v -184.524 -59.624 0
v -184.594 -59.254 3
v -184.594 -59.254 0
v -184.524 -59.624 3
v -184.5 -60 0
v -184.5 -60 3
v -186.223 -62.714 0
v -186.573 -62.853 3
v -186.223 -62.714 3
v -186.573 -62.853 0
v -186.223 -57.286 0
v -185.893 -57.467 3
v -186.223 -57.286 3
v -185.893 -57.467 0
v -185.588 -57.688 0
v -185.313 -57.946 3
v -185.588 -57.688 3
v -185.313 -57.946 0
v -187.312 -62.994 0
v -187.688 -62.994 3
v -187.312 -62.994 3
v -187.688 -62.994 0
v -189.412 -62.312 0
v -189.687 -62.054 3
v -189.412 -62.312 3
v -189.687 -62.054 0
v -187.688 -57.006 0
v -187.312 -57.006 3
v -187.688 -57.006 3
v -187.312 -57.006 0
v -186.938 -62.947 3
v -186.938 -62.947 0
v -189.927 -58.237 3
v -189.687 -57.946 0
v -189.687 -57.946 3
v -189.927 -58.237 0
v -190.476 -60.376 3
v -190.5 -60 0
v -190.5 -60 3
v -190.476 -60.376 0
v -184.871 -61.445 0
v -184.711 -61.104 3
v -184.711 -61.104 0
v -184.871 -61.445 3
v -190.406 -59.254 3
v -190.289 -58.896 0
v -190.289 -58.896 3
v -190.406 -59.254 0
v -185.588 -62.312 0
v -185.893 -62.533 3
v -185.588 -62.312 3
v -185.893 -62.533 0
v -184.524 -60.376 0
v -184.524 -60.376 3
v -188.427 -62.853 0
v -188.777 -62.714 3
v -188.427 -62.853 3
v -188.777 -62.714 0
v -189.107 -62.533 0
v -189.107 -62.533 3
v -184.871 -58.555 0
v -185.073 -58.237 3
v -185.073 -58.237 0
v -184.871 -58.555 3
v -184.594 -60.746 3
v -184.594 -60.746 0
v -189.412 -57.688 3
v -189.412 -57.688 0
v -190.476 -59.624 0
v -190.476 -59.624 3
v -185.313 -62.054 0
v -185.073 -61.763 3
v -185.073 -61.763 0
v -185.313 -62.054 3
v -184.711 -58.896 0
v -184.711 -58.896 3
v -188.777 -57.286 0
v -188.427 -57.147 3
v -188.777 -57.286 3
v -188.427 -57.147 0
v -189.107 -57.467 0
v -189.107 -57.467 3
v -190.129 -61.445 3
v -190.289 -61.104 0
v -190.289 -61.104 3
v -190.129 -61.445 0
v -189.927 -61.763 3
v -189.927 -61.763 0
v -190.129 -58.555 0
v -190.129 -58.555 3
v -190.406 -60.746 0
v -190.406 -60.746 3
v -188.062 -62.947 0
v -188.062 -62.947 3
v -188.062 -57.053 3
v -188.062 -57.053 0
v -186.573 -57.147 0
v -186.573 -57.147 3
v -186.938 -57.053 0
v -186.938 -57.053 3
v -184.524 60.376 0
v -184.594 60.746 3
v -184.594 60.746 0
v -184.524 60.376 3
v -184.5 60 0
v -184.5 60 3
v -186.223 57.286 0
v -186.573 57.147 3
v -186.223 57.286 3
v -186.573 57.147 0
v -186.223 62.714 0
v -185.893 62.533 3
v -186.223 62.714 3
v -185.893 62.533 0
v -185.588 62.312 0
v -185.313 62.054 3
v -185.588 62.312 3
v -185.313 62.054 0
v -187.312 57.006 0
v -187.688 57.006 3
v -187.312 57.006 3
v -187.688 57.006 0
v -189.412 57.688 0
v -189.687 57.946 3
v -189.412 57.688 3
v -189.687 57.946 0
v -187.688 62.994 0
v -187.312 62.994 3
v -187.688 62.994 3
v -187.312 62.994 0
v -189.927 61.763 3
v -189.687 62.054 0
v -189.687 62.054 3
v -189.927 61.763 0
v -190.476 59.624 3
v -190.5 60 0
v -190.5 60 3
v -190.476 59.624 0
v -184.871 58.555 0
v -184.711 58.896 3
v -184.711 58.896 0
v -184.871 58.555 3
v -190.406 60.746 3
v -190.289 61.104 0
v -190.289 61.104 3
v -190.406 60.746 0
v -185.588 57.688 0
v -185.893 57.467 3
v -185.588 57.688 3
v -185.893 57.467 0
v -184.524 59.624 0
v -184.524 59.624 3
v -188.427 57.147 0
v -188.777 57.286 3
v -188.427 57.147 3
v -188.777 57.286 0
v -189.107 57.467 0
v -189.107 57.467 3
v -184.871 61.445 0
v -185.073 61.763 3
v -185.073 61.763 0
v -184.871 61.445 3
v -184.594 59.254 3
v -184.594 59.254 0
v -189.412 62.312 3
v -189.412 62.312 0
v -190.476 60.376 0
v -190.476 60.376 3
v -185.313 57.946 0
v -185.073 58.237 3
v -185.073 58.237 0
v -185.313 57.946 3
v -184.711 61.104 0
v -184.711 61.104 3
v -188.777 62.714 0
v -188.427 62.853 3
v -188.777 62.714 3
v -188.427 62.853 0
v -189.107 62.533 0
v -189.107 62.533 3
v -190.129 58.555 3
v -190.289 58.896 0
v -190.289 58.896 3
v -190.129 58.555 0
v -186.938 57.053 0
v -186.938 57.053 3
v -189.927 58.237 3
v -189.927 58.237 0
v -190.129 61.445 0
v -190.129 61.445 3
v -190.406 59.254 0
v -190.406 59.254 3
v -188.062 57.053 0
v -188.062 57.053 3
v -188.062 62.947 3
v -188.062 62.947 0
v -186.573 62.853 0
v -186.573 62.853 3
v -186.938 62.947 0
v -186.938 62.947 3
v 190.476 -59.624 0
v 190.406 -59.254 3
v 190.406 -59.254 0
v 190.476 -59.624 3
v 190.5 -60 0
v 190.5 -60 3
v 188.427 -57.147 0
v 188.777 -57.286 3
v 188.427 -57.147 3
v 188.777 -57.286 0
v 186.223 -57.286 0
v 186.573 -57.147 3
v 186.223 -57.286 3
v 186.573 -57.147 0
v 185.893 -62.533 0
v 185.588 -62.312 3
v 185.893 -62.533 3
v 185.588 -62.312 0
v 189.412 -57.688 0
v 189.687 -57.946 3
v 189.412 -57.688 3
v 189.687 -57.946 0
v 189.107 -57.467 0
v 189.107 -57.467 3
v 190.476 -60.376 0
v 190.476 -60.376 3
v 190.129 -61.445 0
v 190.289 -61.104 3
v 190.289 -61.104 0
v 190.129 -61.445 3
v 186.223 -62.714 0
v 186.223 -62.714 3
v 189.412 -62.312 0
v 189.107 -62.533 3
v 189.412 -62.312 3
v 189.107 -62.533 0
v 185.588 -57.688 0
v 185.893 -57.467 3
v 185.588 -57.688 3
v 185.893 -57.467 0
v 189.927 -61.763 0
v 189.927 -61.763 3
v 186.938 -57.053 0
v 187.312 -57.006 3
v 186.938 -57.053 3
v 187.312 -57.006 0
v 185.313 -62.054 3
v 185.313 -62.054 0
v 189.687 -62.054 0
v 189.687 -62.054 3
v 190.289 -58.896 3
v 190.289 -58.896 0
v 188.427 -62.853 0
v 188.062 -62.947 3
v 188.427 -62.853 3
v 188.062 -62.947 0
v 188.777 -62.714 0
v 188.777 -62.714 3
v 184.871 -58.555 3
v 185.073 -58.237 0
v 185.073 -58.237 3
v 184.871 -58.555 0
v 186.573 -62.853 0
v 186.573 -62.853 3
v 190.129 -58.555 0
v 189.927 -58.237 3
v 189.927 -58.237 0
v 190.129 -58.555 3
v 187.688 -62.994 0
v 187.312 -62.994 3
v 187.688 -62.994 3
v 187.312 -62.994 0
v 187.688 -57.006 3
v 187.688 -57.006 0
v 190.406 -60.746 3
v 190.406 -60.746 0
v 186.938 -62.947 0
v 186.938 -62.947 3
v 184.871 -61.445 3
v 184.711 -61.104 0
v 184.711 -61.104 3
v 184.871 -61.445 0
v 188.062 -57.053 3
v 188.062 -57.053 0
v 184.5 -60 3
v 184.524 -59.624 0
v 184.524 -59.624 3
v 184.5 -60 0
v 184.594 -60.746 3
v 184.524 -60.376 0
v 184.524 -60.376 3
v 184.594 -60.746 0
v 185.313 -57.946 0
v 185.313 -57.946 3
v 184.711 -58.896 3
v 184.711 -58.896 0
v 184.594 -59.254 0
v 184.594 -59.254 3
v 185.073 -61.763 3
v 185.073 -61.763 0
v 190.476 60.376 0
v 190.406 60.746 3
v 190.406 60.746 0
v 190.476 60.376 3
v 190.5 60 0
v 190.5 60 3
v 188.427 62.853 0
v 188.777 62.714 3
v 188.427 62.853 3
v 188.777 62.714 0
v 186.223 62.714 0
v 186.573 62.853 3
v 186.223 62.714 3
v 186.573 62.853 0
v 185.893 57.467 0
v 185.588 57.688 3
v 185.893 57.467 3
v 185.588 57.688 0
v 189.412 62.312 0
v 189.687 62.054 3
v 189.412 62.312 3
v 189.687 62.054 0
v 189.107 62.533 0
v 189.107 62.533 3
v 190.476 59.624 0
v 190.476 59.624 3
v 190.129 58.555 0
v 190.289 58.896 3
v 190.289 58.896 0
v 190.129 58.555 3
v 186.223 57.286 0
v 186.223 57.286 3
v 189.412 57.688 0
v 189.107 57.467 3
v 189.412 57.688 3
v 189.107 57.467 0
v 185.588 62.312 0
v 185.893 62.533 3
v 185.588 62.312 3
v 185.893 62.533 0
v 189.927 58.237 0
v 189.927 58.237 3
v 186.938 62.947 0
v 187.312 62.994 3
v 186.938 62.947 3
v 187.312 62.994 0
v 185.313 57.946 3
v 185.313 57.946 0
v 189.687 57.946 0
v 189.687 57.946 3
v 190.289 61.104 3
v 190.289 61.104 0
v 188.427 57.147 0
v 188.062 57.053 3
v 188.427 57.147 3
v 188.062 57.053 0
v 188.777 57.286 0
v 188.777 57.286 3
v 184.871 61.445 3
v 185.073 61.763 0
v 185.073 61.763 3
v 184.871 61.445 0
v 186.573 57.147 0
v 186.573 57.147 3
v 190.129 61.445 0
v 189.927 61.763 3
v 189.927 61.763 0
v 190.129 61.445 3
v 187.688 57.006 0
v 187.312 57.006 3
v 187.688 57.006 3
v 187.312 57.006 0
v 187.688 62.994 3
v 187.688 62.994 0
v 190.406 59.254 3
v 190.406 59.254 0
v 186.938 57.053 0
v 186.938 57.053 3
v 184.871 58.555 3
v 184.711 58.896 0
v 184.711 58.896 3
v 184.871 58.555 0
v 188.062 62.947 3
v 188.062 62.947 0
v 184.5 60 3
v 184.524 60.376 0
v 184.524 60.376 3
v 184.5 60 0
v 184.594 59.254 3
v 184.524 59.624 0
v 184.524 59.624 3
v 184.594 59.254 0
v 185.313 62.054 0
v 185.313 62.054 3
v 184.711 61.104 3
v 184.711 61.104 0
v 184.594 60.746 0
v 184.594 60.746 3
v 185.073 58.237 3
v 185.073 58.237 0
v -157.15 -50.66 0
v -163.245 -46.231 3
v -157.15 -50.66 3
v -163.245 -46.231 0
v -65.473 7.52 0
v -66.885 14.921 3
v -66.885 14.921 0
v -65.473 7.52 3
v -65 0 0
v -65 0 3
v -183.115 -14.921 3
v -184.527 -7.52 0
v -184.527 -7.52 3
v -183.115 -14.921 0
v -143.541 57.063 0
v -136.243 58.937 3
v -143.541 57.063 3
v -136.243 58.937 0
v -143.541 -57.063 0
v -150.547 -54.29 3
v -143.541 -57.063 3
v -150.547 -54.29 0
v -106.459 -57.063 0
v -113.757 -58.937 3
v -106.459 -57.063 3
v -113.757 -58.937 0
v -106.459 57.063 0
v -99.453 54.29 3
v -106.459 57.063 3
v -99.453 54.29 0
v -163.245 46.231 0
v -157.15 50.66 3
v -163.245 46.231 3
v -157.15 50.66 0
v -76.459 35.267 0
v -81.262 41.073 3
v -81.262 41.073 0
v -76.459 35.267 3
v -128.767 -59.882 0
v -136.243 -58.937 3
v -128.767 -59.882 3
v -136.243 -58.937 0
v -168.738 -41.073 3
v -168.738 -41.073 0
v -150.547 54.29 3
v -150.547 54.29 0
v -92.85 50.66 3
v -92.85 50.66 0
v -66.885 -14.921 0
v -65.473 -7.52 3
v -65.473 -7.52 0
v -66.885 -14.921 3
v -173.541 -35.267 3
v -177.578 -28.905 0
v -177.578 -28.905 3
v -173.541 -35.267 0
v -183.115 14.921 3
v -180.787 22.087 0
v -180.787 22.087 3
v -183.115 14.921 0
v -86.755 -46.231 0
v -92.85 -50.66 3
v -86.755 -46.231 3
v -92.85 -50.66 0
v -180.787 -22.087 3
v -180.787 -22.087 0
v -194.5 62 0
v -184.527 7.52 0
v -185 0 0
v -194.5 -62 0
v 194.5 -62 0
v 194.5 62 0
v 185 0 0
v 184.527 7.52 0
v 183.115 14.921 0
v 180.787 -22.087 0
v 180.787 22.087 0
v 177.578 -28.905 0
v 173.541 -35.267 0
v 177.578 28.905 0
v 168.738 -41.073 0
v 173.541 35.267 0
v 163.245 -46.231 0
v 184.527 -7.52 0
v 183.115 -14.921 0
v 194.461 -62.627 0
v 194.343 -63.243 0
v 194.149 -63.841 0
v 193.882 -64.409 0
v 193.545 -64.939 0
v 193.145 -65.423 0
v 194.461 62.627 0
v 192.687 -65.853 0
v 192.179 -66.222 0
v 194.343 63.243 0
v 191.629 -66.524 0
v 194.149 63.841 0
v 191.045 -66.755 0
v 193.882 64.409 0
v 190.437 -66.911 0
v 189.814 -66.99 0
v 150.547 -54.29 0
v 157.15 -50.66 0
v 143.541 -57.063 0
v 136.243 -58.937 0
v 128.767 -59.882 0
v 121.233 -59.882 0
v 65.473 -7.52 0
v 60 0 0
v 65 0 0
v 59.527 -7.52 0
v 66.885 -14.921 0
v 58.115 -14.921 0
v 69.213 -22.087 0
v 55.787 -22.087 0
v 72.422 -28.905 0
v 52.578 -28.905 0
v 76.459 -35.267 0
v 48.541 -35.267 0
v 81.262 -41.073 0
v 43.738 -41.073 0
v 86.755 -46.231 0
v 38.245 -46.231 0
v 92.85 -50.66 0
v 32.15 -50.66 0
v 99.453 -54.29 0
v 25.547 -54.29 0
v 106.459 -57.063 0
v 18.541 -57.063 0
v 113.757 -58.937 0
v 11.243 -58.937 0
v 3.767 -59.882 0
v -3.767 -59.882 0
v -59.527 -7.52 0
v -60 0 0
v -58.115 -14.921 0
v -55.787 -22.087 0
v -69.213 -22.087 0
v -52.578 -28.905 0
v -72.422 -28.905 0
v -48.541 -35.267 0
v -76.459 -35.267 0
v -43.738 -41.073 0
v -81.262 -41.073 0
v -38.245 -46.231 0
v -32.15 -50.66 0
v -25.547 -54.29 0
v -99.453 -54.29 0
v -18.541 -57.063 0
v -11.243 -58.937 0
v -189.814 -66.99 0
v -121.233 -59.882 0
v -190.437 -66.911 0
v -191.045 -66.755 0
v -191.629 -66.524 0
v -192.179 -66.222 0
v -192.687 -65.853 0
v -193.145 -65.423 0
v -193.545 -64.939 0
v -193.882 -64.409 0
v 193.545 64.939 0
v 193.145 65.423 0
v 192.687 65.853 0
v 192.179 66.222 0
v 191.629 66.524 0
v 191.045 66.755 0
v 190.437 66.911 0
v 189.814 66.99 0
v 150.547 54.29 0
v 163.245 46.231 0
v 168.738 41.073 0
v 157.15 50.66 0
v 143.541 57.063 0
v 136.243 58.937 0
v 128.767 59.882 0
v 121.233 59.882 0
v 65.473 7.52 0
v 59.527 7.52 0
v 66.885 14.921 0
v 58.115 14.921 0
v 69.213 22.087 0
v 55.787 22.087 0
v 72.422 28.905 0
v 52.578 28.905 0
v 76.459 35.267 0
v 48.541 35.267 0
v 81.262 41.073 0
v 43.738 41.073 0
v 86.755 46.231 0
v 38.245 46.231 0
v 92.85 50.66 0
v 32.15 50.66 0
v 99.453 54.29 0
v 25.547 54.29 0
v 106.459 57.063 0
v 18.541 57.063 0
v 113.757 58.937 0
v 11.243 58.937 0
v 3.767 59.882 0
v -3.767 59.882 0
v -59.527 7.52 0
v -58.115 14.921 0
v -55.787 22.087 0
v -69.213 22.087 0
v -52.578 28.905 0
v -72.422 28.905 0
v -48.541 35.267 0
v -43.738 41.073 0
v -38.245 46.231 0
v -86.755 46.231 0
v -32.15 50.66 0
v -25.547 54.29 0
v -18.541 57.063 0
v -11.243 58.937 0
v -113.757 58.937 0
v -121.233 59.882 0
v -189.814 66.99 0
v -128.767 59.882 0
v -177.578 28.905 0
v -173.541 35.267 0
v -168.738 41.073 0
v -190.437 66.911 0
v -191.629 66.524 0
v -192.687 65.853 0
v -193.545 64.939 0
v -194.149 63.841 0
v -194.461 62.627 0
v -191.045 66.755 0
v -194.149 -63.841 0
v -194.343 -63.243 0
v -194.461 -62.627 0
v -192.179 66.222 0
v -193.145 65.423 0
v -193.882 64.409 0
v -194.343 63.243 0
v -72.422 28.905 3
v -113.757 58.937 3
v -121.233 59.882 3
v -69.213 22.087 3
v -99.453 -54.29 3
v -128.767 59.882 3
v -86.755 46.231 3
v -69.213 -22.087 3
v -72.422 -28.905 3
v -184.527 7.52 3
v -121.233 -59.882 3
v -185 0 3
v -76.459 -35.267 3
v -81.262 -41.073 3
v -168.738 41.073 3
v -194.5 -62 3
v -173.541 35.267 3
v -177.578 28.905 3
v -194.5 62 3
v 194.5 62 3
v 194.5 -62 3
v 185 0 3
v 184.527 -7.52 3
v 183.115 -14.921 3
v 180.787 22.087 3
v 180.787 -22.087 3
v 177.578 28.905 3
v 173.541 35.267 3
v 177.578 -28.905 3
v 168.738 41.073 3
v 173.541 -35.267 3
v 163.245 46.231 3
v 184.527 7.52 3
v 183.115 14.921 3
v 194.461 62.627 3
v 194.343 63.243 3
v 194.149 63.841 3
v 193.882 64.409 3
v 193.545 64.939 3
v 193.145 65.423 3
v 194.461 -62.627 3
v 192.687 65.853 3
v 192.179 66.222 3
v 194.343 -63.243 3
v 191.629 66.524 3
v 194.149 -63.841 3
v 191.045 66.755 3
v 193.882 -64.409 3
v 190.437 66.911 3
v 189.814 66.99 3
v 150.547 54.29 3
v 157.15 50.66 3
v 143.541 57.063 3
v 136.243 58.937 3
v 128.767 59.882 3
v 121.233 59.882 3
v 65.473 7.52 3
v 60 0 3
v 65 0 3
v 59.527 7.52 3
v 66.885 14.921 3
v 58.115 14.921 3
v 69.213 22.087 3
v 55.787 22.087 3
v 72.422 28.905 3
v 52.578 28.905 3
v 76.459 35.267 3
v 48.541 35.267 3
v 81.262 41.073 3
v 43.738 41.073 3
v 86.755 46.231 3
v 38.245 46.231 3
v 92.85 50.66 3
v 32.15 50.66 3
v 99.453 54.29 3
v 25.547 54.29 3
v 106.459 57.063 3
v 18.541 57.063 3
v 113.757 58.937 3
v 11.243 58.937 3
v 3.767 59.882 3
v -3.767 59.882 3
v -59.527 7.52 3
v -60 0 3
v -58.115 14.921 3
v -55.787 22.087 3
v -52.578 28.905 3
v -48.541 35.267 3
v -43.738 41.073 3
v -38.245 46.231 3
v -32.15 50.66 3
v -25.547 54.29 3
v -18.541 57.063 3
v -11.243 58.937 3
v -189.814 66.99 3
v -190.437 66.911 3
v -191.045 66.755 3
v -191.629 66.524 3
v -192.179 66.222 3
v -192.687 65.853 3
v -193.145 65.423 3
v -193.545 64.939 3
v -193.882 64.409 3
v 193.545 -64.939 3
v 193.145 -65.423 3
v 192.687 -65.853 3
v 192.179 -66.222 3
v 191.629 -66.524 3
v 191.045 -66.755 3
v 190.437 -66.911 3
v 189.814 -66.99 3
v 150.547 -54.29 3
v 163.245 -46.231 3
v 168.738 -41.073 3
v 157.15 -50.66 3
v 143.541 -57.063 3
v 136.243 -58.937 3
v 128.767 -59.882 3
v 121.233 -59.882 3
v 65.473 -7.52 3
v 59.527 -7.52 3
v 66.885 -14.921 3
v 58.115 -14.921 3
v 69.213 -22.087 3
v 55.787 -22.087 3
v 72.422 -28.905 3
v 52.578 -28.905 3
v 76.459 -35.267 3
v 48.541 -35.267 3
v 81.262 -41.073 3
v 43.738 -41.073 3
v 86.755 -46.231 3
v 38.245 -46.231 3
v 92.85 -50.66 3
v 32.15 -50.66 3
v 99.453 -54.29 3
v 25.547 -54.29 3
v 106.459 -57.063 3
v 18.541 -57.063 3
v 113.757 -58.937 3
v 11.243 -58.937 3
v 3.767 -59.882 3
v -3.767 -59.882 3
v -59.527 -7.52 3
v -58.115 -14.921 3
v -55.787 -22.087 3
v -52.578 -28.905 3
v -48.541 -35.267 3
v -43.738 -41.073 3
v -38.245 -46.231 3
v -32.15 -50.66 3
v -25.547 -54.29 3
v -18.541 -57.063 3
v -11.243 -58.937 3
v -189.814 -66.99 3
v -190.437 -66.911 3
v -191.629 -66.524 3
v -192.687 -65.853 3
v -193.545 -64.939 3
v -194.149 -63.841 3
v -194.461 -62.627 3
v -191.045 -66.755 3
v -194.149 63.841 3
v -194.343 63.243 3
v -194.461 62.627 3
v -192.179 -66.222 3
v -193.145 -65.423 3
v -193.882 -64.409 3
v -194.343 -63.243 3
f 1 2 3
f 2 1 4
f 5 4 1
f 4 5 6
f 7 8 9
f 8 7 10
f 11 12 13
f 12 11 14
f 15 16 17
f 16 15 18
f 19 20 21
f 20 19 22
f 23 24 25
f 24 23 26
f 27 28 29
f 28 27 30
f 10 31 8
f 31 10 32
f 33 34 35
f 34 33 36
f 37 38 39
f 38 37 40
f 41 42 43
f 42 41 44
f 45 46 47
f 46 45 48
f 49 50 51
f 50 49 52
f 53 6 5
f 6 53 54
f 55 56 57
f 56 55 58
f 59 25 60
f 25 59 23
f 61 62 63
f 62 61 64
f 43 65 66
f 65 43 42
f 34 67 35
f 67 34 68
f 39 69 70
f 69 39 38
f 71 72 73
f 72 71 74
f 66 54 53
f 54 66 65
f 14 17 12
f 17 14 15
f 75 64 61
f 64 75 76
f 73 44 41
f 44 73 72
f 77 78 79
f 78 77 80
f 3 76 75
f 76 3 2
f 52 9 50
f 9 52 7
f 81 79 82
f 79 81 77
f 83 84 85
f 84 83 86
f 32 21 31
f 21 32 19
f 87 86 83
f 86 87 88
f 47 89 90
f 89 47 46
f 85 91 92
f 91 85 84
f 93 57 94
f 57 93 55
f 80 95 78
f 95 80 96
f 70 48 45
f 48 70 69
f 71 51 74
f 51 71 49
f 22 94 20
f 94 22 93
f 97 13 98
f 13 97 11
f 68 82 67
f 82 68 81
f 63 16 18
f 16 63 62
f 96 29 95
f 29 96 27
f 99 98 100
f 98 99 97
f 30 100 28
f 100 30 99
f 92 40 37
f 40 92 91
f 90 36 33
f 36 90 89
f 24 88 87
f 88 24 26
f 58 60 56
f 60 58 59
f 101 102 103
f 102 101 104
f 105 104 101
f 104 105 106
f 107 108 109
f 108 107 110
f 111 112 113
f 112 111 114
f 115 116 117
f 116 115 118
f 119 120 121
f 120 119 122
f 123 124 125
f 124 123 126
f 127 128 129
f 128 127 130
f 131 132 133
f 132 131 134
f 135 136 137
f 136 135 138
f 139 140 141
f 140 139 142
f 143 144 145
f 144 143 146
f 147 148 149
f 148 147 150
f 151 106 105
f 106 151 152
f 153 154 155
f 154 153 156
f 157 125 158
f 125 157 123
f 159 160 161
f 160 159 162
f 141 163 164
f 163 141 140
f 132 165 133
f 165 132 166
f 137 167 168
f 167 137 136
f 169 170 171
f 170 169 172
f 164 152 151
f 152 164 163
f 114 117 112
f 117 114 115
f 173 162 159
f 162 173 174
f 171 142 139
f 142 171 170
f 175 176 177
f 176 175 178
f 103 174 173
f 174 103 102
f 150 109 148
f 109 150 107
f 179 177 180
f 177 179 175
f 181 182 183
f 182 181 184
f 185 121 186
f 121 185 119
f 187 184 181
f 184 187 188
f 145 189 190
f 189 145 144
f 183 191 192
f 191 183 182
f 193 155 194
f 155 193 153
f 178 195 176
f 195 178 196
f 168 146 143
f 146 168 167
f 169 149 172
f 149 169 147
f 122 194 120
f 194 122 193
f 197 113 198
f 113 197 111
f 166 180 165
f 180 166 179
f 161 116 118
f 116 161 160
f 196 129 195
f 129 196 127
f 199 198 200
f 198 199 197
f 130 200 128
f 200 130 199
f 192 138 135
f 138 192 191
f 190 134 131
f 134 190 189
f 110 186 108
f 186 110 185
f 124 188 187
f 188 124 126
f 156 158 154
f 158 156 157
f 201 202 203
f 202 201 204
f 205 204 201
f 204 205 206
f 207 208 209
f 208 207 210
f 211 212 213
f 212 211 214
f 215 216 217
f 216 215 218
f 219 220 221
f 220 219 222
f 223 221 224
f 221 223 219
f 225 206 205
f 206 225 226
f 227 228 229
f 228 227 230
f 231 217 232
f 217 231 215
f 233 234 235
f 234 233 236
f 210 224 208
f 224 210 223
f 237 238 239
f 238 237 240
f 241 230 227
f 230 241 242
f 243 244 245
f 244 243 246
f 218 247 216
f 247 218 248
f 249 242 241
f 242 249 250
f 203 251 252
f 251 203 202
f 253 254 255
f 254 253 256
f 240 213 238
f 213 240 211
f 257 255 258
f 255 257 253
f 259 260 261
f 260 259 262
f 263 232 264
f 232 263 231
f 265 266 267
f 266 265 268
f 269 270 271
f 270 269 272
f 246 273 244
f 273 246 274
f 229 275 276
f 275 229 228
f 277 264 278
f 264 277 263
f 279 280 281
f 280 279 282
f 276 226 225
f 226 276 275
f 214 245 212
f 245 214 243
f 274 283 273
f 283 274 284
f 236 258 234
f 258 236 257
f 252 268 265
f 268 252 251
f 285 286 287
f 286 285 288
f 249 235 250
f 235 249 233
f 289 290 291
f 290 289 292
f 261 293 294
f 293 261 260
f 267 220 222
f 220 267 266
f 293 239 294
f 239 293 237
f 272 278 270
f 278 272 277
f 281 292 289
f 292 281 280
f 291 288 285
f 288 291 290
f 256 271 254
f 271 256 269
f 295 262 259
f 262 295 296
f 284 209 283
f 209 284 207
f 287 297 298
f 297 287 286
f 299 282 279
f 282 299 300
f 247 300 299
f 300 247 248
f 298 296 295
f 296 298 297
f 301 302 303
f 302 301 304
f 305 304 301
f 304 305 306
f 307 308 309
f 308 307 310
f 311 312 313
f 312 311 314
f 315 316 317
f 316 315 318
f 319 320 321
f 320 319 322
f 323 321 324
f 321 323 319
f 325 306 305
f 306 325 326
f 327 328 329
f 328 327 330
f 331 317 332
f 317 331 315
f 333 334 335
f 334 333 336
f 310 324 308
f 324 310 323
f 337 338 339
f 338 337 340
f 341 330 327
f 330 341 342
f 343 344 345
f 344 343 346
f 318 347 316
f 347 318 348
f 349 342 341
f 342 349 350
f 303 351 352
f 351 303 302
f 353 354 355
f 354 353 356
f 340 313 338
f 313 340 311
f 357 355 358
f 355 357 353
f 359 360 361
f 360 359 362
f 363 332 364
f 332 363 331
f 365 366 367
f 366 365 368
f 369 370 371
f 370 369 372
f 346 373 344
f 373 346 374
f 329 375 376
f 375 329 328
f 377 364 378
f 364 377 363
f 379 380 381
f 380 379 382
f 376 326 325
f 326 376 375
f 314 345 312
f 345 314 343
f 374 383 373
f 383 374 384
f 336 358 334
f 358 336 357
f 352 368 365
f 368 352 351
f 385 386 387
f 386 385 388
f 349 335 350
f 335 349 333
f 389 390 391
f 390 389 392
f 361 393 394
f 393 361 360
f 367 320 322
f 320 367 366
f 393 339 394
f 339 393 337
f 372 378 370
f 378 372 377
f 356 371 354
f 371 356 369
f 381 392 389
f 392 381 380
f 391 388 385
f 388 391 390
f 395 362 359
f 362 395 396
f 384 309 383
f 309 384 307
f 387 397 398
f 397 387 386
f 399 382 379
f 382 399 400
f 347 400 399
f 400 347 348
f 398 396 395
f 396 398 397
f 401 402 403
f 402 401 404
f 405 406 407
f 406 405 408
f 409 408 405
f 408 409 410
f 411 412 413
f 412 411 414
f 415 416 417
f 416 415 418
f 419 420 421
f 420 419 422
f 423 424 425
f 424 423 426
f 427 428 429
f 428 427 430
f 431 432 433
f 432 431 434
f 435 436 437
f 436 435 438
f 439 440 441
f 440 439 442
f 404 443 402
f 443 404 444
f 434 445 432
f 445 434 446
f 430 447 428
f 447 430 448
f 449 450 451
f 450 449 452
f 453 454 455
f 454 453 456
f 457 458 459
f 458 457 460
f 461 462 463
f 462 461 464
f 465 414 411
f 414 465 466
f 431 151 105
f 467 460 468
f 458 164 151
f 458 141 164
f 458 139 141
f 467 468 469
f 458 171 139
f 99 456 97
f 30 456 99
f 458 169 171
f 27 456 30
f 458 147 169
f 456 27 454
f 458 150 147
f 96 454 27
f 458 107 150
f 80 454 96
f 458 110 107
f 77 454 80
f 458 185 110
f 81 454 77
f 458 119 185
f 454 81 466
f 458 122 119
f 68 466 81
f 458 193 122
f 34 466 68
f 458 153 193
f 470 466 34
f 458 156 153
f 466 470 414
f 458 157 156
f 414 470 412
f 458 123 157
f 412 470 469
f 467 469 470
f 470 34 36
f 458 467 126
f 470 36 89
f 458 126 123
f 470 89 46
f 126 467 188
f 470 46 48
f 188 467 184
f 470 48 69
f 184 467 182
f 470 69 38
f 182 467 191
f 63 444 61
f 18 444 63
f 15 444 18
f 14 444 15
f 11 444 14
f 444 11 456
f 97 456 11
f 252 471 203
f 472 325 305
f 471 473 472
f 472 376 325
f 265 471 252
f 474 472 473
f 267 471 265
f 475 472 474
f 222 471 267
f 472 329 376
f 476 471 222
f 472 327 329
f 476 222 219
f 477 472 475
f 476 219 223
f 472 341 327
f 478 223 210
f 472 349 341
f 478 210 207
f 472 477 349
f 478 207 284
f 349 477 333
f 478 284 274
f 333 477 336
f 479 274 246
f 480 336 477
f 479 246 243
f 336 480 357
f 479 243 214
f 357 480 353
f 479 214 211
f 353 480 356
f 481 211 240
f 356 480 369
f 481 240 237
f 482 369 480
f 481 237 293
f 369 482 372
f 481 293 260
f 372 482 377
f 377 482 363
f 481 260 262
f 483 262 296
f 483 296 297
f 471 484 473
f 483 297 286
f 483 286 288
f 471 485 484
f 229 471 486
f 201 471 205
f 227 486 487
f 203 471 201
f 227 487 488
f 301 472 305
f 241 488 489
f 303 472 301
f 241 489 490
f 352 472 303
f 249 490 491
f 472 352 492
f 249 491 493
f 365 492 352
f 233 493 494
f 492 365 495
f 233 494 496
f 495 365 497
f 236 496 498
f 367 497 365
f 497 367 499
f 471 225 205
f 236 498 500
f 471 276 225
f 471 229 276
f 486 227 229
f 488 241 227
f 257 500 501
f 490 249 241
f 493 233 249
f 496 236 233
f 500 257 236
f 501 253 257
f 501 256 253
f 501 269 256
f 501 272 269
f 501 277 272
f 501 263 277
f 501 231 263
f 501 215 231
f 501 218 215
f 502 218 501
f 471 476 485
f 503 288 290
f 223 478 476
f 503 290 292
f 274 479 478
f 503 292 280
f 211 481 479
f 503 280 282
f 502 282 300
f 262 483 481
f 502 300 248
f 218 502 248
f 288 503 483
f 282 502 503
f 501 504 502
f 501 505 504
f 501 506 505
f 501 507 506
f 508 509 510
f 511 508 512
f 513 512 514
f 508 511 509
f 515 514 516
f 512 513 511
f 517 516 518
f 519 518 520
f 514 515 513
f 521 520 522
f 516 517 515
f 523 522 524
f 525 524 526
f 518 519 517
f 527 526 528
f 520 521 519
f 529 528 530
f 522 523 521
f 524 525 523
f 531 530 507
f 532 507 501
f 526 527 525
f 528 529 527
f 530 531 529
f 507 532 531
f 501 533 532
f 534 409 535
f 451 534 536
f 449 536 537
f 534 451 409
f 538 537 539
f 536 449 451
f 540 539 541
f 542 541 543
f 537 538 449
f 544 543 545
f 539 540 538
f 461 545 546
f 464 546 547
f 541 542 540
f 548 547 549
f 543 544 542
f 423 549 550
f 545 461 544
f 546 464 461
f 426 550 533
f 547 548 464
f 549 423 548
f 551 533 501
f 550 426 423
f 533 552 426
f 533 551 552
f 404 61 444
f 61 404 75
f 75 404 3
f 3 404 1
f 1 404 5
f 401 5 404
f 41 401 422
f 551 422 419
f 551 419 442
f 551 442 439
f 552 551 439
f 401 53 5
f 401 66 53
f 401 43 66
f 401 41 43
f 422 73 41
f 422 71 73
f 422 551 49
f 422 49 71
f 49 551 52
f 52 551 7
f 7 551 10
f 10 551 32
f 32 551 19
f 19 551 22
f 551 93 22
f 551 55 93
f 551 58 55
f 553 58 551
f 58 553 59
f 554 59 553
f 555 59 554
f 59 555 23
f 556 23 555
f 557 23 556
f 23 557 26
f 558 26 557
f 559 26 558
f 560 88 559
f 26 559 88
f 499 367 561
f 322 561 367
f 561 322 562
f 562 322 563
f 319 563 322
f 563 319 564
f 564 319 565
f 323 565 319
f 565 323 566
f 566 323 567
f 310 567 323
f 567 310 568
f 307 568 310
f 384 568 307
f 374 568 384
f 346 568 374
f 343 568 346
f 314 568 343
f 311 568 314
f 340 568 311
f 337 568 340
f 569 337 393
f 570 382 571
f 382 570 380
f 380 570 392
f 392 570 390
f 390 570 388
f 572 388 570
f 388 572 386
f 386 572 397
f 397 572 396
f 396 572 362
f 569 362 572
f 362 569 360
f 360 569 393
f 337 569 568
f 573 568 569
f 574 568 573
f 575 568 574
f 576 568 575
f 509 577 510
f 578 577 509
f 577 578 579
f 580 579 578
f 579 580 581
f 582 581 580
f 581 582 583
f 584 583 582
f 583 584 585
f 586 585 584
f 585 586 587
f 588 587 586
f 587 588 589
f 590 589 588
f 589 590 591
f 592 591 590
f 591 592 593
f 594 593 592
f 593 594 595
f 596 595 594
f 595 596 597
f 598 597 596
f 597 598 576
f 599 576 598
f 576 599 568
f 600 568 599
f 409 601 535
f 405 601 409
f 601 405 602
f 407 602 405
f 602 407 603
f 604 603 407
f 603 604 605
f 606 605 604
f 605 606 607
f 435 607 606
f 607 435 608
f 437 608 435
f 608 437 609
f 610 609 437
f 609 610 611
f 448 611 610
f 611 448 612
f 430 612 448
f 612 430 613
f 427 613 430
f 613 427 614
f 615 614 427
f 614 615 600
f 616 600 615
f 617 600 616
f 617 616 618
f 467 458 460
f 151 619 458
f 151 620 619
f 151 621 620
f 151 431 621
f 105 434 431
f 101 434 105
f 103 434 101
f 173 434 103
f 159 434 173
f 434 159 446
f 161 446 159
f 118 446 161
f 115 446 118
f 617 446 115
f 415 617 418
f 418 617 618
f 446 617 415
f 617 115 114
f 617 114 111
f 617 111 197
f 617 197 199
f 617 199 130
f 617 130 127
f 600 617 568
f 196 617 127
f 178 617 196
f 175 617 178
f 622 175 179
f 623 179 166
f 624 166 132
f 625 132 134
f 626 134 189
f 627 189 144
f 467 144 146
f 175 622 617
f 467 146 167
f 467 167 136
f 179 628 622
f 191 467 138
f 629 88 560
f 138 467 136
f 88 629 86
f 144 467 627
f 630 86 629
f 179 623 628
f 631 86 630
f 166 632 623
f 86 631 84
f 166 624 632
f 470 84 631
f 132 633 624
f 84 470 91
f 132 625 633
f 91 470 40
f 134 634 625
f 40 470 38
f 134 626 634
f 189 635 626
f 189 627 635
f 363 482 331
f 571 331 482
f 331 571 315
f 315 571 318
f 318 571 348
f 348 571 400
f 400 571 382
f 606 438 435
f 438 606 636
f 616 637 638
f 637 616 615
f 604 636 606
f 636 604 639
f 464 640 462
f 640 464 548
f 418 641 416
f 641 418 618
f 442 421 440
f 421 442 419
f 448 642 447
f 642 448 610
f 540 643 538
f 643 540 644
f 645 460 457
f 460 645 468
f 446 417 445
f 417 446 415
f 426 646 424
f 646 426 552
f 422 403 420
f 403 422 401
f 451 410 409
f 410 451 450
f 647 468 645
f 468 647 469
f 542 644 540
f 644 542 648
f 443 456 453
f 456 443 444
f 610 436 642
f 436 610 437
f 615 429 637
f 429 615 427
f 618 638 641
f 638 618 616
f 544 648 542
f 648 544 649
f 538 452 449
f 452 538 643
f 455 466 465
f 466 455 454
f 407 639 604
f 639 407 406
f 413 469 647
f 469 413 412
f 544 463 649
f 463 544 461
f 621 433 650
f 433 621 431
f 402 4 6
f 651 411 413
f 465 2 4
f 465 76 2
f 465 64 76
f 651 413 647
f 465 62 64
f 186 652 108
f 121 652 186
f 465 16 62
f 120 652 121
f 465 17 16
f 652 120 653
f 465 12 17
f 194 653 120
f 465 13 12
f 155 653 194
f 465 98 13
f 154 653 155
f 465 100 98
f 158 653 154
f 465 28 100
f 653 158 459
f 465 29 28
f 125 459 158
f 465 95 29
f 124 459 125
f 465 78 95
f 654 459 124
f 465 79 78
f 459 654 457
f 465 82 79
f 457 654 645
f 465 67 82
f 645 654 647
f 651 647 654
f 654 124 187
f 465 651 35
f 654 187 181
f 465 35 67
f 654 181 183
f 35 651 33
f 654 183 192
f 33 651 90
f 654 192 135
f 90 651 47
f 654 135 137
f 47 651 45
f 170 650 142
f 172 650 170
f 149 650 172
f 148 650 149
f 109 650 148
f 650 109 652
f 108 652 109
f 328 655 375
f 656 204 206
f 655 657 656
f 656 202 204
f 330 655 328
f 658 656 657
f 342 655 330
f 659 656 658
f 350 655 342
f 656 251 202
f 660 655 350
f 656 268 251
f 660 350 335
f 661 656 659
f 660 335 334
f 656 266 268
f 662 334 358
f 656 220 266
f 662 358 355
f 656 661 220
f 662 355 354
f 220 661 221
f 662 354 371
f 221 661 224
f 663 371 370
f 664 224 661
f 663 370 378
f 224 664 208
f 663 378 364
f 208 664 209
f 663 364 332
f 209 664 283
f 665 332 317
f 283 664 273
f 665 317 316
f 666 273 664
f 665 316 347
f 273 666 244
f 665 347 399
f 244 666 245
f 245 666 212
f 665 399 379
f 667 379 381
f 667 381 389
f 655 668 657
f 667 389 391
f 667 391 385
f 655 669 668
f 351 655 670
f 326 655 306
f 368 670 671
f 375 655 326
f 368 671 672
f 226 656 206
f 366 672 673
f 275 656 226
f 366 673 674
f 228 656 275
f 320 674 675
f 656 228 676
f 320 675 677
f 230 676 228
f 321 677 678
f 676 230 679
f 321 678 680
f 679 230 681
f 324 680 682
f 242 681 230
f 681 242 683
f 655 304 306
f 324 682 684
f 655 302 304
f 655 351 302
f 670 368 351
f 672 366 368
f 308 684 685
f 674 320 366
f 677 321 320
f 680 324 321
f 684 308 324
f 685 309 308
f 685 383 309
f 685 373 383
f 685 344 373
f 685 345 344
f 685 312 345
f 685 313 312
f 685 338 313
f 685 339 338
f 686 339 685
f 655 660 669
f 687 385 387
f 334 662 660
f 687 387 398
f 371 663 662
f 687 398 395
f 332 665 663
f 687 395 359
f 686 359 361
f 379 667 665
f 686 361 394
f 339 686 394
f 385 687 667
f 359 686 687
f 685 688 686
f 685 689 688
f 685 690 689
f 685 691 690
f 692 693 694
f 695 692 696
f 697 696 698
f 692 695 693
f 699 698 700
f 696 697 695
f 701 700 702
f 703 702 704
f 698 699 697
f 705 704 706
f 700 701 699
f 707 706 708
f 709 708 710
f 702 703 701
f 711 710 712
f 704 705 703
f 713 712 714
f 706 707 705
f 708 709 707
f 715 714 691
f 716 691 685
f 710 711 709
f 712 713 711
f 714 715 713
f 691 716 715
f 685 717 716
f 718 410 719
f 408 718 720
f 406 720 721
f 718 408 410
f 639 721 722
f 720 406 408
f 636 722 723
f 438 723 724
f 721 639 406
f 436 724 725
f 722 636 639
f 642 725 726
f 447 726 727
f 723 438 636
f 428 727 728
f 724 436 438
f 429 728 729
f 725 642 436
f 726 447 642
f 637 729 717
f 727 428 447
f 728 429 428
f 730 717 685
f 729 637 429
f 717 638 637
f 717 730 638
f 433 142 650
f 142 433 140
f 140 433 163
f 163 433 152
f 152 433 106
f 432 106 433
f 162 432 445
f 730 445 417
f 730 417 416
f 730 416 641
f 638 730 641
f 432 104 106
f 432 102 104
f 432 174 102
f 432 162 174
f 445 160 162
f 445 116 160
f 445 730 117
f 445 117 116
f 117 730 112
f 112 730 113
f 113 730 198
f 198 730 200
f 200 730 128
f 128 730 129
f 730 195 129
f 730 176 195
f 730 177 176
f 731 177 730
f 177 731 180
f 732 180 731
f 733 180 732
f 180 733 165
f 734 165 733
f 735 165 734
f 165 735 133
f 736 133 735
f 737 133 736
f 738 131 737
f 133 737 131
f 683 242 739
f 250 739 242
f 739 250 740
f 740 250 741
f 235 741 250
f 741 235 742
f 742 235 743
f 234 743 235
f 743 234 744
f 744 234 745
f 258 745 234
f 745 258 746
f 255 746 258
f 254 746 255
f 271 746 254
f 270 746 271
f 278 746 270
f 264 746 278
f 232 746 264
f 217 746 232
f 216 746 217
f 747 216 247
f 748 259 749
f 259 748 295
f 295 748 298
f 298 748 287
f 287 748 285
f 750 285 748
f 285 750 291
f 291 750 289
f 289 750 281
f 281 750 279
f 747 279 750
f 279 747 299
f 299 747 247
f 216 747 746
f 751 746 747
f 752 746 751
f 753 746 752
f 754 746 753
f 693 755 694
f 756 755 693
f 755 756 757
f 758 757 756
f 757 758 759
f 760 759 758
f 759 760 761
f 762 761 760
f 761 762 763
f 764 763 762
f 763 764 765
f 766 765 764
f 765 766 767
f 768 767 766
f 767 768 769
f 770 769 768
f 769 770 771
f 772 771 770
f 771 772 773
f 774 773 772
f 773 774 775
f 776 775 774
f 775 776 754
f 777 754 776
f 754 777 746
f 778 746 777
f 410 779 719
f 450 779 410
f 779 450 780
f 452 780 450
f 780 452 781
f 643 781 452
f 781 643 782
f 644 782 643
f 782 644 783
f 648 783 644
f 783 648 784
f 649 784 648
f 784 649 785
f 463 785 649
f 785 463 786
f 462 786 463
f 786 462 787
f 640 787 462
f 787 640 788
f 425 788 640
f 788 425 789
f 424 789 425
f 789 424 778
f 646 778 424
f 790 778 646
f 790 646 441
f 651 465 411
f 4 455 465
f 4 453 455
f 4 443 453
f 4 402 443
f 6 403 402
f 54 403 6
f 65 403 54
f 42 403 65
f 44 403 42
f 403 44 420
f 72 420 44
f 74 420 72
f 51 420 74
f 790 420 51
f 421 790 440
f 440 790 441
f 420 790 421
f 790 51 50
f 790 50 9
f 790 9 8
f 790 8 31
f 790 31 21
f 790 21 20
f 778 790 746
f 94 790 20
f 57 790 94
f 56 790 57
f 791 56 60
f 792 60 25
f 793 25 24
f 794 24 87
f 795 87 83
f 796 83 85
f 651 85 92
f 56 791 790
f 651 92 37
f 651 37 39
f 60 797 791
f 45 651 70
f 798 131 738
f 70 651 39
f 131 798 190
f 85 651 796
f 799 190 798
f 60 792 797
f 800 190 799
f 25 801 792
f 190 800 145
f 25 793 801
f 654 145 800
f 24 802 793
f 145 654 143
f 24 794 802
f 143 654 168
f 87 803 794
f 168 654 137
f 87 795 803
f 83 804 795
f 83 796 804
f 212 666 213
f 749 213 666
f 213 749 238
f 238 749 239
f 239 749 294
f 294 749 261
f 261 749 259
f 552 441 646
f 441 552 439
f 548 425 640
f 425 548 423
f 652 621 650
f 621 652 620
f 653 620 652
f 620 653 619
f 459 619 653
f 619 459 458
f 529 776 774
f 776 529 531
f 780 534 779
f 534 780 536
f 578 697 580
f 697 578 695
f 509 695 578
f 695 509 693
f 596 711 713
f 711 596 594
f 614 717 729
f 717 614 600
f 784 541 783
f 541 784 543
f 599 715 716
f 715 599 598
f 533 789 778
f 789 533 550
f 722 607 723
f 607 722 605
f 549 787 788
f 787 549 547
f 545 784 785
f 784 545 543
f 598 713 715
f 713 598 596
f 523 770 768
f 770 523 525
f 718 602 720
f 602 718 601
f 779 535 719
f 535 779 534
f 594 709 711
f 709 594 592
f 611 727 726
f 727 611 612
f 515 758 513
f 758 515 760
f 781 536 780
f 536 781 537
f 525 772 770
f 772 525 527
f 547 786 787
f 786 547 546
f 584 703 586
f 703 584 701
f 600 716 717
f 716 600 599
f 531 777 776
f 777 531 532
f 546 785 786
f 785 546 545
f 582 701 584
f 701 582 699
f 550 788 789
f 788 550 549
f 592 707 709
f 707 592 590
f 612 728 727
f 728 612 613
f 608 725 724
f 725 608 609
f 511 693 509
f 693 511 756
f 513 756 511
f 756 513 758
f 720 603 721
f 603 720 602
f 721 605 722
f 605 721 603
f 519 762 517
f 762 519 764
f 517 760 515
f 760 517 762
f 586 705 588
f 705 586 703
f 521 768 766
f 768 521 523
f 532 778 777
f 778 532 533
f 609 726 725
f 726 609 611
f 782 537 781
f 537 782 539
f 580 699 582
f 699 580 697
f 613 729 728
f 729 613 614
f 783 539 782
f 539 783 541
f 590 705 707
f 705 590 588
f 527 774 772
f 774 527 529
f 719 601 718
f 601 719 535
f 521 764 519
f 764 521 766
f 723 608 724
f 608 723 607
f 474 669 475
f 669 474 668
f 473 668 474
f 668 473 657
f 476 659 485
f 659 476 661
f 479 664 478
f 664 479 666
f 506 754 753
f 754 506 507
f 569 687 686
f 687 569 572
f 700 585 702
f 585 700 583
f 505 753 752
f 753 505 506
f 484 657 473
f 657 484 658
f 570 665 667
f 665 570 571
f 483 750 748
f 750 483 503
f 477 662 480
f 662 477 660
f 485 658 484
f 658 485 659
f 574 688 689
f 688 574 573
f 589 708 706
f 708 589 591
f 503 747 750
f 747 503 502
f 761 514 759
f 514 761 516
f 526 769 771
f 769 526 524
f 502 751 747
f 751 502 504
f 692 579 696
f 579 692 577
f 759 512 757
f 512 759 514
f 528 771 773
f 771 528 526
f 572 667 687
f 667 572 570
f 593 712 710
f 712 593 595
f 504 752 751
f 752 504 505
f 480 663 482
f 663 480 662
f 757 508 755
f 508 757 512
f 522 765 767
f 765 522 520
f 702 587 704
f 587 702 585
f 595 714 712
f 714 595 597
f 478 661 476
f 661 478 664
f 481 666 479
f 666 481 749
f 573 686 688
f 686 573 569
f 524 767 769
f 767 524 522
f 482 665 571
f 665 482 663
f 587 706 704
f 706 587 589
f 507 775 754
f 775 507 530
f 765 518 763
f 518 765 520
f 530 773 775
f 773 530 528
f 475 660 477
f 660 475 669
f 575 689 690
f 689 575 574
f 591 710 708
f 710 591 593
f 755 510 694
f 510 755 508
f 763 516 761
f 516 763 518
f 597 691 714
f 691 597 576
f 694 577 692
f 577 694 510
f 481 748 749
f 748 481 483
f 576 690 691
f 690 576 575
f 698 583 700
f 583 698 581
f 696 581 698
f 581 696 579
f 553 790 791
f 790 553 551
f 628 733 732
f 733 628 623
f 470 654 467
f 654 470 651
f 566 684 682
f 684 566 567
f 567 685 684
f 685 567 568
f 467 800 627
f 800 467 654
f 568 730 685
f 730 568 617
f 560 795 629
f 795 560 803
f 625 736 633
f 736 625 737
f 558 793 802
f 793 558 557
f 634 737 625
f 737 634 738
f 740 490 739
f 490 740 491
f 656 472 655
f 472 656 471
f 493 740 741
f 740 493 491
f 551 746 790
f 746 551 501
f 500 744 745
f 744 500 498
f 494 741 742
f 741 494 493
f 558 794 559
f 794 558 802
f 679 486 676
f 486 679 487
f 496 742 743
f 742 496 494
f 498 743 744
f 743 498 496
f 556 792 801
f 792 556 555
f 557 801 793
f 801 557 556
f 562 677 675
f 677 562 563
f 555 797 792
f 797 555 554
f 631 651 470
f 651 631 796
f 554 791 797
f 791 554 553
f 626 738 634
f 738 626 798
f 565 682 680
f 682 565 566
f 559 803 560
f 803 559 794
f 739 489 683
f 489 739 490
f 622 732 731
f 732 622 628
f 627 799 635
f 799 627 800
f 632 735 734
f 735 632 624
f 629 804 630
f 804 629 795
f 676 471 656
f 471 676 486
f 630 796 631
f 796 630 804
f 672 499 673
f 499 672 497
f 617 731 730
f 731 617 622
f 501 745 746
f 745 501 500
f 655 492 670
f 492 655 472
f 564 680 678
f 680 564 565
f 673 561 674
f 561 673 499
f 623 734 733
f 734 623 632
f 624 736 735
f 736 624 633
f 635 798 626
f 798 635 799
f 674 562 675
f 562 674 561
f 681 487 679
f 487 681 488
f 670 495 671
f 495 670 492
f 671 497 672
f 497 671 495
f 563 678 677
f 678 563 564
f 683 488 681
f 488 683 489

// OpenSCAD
$fn = 50;


difference() {
	union() {
		hull() {
			translate(v = [-189.5000000000, 62.0000000000, 0]) {
				cylinder(h = 3, r = 5);
			}
			translate(v = [189.5000000000, 62.0000000000, 0]) {
				cylinder(h = 3, r = 5);
			}
			translate(v = [-189.5000000000, -62.0000000000, 0]) {
				cylinder(h = 3, r = 5);
			}
			translate(v = [189.5000000000, -62.0000000000, 0]) {
				cylinder(h = 3, r = 5);
			}
		}
	}
	union() {
		#translate(v = [-187.5000000000, -60.0000000000, -100.0000000000]) {
			cylinder(h = 200, r = 3.0000000000);
		}
		#translate(v = [-187.5000000000, 60.0000000000, -100.0000000000]) {
			cylinder(h = 200, r = 3.0000000000);
		}
		#translate(v = [187.5000000000, -60.0000000000, -100.0000000000]) {
			cylinder(h = 200, r = 3.0000000000);
		}
		#translate(v = [187.5000000000, 60.0000000000, -100.0000000000]) {
			cylinder(h = 200, r = 3.0000000000);
		}
		#translate(v = [-125.0000000000, 0, 0]) {
			cylinder(h = 3, r = 60.0000000000);
		}
		#cylinder(h = 3, r = 60.0000000000);
		#translate(v = [125.0000000000, 0, 0]) {
			cylinder(h = 3, r = 60.0000000000);
		}
	}
}
